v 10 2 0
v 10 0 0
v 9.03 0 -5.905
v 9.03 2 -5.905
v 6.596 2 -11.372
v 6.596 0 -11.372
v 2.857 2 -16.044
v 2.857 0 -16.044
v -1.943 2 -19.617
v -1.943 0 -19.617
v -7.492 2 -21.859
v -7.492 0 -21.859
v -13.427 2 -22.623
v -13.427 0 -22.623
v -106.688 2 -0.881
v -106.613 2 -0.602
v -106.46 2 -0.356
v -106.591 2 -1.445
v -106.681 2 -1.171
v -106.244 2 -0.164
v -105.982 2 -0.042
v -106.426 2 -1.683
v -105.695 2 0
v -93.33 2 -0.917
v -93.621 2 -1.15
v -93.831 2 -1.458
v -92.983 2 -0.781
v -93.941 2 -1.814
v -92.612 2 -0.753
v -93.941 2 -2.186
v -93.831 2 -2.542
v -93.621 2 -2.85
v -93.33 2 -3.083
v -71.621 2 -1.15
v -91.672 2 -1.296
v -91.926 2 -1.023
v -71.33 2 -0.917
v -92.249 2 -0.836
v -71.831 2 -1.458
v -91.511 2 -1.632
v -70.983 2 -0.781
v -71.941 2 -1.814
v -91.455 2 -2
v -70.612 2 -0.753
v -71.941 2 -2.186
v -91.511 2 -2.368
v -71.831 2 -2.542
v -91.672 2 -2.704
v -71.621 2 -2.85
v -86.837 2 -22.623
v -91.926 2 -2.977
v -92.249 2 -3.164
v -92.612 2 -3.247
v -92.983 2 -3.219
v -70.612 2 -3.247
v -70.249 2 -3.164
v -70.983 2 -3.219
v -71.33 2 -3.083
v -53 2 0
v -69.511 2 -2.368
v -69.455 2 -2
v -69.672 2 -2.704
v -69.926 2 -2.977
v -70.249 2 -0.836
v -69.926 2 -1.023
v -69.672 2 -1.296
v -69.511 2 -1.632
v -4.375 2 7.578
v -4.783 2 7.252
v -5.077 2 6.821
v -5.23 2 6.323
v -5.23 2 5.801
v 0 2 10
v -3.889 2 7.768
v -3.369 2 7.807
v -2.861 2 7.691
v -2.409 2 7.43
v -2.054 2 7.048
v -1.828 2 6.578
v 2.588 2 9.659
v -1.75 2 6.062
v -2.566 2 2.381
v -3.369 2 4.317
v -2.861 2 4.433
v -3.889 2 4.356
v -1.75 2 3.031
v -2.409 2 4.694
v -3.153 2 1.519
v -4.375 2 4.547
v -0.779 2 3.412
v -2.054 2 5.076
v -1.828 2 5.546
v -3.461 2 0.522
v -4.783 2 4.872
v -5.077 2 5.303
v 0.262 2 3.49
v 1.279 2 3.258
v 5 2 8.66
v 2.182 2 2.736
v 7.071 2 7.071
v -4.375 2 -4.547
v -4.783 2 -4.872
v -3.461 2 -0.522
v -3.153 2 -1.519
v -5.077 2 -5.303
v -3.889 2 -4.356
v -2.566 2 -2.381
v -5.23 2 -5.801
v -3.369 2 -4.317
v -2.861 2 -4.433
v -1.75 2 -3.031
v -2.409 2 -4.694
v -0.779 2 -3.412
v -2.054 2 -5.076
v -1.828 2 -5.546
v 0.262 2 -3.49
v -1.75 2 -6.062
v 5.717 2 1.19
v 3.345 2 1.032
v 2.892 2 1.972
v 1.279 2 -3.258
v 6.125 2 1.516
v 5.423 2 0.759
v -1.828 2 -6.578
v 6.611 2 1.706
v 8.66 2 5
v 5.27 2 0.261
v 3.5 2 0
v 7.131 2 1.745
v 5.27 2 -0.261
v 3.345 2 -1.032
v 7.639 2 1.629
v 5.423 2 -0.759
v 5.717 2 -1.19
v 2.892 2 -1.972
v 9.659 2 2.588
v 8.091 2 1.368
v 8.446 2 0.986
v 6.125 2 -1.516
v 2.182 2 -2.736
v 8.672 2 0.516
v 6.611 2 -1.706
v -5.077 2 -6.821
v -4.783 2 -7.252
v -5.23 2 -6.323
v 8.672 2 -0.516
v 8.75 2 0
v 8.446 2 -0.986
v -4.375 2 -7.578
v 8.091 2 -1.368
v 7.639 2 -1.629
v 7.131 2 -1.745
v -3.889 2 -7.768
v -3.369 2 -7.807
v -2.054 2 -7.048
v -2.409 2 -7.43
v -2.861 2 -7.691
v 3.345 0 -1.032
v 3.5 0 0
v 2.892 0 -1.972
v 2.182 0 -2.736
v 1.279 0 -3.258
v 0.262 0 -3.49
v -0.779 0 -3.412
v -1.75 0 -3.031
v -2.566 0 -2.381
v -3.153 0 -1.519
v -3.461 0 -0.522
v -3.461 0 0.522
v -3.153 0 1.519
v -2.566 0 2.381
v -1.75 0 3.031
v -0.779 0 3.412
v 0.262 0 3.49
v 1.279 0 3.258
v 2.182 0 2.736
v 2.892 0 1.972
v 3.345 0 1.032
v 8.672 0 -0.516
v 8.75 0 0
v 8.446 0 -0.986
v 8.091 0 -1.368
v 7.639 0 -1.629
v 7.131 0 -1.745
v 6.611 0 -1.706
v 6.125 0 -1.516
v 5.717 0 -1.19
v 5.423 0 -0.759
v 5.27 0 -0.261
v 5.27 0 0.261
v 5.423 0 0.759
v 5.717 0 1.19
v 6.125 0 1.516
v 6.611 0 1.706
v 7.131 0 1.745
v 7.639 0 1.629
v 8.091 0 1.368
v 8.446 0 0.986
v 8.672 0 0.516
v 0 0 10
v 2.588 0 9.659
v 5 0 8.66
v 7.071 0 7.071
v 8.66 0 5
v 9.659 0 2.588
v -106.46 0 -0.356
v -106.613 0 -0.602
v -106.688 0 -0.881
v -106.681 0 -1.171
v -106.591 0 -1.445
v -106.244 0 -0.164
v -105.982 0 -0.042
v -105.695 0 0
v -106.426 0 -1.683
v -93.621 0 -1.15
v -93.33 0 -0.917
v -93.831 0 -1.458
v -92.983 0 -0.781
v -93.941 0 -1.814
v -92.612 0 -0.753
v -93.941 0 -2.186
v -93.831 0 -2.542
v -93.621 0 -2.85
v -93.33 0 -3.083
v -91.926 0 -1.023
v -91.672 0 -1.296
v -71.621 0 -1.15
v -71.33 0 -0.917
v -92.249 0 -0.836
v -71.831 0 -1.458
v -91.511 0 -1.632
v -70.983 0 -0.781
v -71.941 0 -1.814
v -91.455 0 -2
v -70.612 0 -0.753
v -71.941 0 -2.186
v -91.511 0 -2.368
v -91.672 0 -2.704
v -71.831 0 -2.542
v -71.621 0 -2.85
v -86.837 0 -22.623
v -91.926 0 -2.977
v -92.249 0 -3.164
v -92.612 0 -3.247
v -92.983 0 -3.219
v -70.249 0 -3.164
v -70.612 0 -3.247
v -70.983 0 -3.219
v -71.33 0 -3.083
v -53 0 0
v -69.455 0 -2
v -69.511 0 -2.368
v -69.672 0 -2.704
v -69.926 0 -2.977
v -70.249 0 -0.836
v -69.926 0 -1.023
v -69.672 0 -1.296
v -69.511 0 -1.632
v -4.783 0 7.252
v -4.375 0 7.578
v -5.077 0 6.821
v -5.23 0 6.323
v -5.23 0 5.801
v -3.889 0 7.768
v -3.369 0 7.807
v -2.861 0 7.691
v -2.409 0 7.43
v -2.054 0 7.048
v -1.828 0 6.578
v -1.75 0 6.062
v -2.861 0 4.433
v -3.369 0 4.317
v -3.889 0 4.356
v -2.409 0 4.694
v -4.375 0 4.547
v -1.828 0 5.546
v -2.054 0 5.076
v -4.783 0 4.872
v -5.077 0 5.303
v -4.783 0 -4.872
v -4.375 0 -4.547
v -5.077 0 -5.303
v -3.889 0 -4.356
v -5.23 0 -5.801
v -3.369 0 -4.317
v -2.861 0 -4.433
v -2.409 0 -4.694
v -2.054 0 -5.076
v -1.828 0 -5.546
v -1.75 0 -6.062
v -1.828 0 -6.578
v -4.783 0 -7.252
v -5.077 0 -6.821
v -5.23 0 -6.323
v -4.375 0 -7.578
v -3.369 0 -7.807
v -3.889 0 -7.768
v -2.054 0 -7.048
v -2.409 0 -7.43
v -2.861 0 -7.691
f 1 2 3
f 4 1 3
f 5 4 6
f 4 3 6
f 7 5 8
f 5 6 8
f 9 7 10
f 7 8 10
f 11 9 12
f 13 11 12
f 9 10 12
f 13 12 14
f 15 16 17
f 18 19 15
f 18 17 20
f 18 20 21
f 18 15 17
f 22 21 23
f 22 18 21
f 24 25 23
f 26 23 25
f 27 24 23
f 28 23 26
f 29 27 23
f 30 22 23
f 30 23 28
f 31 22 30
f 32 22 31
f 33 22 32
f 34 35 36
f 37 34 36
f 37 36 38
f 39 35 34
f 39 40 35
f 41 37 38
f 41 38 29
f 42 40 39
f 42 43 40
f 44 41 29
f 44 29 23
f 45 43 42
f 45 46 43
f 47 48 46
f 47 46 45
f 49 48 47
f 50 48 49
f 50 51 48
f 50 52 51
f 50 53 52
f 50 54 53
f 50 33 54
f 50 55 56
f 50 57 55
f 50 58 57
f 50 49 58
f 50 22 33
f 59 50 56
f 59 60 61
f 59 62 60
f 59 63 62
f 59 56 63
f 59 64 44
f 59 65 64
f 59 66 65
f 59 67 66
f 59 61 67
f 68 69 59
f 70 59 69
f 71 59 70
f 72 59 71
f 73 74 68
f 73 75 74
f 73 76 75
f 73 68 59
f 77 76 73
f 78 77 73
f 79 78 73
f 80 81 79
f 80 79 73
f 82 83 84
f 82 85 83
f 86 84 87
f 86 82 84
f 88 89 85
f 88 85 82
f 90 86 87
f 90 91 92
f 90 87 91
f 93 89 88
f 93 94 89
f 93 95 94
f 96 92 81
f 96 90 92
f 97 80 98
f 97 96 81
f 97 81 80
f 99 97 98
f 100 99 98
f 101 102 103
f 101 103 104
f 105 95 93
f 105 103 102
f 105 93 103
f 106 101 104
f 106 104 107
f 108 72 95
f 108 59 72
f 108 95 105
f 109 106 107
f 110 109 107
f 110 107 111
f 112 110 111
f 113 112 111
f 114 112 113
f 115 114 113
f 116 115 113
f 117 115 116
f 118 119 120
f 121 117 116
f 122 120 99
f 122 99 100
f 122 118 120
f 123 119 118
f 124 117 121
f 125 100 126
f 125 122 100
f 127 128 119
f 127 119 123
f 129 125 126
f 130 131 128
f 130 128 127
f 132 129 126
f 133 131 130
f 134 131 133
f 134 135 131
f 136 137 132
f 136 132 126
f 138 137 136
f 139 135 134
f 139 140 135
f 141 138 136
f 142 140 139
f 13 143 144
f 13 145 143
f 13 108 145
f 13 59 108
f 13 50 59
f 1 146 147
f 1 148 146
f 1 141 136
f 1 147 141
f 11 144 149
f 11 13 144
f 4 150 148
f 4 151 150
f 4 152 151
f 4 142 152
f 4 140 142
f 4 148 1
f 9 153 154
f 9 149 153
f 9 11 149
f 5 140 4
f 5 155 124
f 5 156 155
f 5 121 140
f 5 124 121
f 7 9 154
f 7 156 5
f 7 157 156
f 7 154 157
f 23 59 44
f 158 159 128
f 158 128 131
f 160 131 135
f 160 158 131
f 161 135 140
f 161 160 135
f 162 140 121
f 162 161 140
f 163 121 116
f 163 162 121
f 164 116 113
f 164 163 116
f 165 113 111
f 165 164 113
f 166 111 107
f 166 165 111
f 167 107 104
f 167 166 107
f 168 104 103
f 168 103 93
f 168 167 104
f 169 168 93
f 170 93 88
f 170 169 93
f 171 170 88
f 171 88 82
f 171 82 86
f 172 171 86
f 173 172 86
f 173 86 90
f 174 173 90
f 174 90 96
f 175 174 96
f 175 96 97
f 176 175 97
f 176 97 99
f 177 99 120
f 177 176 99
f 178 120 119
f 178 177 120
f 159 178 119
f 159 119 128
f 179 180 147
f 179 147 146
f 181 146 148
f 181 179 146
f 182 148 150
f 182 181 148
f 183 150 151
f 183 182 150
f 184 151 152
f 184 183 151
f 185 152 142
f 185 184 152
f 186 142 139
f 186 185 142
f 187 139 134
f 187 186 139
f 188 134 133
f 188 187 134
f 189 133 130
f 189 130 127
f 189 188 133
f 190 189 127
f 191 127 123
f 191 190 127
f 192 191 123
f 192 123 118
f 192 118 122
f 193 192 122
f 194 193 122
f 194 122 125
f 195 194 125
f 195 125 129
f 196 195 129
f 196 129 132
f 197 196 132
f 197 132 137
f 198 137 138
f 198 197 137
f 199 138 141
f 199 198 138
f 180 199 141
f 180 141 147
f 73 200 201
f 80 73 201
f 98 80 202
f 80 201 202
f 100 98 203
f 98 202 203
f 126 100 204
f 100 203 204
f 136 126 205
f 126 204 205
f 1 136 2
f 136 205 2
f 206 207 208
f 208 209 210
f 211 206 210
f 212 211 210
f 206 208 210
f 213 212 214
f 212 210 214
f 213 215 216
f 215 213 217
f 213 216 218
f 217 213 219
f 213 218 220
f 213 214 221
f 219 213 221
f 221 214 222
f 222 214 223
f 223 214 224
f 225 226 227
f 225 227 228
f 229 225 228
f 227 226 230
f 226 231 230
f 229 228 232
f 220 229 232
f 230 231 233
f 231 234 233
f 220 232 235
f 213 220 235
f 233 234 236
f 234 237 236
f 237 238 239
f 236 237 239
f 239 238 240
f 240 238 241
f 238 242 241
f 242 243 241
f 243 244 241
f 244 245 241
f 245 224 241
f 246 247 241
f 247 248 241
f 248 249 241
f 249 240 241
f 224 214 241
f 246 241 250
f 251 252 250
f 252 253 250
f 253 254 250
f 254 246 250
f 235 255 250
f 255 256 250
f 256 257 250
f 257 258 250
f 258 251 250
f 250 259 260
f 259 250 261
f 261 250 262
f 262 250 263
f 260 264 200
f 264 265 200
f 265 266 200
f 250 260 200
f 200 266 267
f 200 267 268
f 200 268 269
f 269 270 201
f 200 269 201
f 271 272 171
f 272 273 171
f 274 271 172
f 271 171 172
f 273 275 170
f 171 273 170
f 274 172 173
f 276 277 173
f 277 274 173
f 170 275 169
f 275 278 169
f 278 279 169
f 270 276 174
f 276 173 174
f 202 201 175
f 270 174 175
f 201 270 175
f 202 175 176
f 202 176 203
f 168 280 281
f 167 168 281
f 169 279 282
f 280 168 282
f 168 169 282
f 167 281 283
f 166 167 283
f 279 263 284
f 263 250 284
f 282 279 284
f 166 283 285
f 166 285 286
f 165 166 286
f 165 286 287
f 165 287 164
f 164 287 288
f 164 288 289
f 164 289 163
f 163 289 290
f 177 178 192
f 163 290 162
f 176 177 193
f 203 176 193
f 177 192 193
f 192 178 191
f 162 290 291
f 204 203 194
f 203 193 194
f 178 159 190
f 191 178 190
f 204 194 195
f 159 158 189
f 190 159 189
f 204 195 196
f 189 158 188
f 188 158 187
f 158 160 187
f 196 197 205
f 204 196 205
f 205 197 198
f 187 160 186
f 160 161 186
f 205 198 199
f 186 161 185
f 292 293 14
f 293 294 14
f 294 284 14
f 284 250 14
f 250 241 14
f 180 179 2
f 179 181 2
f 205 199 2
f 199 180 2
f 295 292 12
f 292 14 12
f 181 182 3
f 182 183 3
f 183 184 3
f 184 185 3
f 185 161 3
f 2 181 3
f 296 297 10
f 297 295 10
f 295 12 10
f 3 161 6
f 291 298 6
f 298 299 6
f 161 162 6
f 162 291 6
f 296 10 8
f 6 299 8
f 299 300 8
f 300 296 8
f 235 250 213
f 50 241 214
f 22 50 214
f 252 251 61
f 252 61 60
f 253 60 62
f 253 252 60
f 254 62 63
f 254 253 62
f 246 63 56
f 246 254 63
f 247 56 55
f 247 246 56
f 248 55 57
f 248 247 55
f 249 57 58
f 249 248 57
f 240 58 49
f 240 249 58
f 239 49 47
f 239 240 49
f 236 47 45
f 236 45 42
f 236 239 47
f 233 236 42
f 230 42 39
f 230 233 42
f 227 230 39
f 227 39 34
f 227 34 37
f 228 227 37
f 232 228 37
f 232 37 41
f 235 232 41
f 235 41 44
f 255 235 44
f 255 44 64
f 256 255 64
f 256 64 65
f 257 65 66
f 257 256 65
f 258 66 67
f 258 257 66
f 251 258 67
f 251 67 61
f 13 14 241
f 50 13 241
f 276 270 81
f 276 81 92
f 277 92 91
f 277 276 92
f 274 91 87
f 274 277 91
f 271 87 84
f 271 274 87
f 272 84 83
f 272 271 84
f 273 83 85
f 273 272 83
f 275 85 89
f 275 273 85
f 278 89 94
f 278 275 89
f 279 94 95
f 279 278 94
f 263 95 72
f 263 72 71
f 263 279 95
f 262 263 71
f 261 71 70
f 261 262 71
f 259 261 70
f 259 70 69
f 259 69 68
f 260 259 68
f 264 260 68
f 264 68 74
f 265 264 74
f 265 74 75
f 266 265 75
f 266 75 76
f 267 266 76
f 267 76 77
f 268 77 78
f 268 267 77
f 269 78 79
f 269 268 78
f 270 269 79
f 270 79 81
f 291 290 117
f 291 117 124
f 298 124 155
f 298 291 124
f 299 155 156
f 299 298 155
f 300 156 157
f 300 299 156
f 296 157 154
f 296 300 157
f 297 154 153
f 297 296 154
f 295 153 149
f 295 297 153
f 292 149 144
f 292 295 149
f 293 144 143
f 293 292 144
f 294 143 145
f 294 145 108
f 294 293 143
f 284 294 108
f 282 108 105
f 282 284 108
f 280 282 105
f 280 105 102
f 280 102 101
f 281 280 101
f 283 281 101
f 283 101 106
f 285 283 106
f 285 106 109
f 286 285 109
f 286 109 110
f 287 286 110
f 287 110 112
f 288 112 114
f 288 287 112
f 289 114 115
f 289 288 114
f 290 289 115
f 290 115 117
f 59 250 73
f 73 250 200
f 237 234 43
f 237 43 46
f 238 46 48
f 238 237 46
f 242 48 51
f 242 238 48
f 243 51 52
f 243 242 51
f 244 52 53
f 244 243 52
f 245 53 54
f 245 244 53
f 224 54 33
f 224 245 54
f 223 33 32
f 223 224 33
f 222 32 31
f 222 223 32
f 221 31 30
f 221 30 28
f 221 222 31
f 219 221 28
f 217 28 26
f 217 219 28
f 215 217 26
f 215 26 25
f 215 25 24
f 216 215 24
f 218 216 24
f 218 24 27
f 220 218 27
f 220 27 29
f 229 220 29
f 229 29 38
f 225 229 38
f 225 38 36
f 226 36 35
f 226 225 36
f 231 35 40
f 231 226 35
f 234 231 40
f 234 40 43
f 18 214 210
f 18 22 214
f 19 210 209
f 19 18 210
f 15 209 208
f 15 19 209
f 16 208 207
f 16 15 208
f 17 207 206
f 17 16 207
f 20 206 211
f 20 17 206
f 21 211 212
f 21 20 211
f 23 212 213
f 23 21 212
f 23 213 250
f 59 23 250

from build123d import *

# Parameters (mm, degrees)
SKETCH1_R           = 3.5
SKETCH1_R_2         = 1.25
SKETCH1_R_3         = 1.75
BOSS_EXTRUDE1_DEPTH = 2
FILLET_1_R          = 1


with BuildPart() as part:
    # Sketch1 → Boss-Extrude1 (new body)
    with BuildSketch(Plane(origin=(0, 0, 0), x_dir=(1, 0, 0), z_dir=(0, 1, 0))):
        with BuildLine():
            Line((-13.426718388, 22.622894631), (-86.83738777, 22.622894631))
            Line((-86.83738777, 22.622894631), (-108, 0))
            Line((-108, 0), (-53, 0))
            Line((-53, 0), (0, -10))
            ThreePointArc((0, -10), (7.071067812, -7.071067812), (10, 0))
            ThreePointArc((10, 0), (2.856758636, 16.043947959), (-13.426718388, 22.622894631))
        make_face()
        Circle(SKETCH1_R, mode=Mode.SUBTRACT)
        with Locations((-92.705183178, 2)):
            Circle(SKETCH1_R_2, mode=Mode.SUBTRACT)
        with Locations((-70.705183178, 2)):
            Circle(SKETCH1_R_2, mode=Mode.SUBTRACT)
        with Locations((-3.5, 6.062177826)):
            Circle(SKETCH1_R_3, mode=Mode.SUBTRACT)
        with Locations((7, 0)):
            Circle(SKETCH1_R_3, mode=Mode.SUBTRACT)
        with Locations((-3.5, -6.062177826)):
            Circle(SKETCH1_R_3, mode=Mode.SUBTRACT)
    extrude(amount=BOSS_EXTRUDE1_DEPTH)

    # Скругление1
    fillet_1_edges = [part.edges().sort_by_distance(p)[0] for p in [
        (-108, 1, 0),
    ]]
    fillet(fillet_1_edges, radius=FILLET_1_R)


solid = part.part
